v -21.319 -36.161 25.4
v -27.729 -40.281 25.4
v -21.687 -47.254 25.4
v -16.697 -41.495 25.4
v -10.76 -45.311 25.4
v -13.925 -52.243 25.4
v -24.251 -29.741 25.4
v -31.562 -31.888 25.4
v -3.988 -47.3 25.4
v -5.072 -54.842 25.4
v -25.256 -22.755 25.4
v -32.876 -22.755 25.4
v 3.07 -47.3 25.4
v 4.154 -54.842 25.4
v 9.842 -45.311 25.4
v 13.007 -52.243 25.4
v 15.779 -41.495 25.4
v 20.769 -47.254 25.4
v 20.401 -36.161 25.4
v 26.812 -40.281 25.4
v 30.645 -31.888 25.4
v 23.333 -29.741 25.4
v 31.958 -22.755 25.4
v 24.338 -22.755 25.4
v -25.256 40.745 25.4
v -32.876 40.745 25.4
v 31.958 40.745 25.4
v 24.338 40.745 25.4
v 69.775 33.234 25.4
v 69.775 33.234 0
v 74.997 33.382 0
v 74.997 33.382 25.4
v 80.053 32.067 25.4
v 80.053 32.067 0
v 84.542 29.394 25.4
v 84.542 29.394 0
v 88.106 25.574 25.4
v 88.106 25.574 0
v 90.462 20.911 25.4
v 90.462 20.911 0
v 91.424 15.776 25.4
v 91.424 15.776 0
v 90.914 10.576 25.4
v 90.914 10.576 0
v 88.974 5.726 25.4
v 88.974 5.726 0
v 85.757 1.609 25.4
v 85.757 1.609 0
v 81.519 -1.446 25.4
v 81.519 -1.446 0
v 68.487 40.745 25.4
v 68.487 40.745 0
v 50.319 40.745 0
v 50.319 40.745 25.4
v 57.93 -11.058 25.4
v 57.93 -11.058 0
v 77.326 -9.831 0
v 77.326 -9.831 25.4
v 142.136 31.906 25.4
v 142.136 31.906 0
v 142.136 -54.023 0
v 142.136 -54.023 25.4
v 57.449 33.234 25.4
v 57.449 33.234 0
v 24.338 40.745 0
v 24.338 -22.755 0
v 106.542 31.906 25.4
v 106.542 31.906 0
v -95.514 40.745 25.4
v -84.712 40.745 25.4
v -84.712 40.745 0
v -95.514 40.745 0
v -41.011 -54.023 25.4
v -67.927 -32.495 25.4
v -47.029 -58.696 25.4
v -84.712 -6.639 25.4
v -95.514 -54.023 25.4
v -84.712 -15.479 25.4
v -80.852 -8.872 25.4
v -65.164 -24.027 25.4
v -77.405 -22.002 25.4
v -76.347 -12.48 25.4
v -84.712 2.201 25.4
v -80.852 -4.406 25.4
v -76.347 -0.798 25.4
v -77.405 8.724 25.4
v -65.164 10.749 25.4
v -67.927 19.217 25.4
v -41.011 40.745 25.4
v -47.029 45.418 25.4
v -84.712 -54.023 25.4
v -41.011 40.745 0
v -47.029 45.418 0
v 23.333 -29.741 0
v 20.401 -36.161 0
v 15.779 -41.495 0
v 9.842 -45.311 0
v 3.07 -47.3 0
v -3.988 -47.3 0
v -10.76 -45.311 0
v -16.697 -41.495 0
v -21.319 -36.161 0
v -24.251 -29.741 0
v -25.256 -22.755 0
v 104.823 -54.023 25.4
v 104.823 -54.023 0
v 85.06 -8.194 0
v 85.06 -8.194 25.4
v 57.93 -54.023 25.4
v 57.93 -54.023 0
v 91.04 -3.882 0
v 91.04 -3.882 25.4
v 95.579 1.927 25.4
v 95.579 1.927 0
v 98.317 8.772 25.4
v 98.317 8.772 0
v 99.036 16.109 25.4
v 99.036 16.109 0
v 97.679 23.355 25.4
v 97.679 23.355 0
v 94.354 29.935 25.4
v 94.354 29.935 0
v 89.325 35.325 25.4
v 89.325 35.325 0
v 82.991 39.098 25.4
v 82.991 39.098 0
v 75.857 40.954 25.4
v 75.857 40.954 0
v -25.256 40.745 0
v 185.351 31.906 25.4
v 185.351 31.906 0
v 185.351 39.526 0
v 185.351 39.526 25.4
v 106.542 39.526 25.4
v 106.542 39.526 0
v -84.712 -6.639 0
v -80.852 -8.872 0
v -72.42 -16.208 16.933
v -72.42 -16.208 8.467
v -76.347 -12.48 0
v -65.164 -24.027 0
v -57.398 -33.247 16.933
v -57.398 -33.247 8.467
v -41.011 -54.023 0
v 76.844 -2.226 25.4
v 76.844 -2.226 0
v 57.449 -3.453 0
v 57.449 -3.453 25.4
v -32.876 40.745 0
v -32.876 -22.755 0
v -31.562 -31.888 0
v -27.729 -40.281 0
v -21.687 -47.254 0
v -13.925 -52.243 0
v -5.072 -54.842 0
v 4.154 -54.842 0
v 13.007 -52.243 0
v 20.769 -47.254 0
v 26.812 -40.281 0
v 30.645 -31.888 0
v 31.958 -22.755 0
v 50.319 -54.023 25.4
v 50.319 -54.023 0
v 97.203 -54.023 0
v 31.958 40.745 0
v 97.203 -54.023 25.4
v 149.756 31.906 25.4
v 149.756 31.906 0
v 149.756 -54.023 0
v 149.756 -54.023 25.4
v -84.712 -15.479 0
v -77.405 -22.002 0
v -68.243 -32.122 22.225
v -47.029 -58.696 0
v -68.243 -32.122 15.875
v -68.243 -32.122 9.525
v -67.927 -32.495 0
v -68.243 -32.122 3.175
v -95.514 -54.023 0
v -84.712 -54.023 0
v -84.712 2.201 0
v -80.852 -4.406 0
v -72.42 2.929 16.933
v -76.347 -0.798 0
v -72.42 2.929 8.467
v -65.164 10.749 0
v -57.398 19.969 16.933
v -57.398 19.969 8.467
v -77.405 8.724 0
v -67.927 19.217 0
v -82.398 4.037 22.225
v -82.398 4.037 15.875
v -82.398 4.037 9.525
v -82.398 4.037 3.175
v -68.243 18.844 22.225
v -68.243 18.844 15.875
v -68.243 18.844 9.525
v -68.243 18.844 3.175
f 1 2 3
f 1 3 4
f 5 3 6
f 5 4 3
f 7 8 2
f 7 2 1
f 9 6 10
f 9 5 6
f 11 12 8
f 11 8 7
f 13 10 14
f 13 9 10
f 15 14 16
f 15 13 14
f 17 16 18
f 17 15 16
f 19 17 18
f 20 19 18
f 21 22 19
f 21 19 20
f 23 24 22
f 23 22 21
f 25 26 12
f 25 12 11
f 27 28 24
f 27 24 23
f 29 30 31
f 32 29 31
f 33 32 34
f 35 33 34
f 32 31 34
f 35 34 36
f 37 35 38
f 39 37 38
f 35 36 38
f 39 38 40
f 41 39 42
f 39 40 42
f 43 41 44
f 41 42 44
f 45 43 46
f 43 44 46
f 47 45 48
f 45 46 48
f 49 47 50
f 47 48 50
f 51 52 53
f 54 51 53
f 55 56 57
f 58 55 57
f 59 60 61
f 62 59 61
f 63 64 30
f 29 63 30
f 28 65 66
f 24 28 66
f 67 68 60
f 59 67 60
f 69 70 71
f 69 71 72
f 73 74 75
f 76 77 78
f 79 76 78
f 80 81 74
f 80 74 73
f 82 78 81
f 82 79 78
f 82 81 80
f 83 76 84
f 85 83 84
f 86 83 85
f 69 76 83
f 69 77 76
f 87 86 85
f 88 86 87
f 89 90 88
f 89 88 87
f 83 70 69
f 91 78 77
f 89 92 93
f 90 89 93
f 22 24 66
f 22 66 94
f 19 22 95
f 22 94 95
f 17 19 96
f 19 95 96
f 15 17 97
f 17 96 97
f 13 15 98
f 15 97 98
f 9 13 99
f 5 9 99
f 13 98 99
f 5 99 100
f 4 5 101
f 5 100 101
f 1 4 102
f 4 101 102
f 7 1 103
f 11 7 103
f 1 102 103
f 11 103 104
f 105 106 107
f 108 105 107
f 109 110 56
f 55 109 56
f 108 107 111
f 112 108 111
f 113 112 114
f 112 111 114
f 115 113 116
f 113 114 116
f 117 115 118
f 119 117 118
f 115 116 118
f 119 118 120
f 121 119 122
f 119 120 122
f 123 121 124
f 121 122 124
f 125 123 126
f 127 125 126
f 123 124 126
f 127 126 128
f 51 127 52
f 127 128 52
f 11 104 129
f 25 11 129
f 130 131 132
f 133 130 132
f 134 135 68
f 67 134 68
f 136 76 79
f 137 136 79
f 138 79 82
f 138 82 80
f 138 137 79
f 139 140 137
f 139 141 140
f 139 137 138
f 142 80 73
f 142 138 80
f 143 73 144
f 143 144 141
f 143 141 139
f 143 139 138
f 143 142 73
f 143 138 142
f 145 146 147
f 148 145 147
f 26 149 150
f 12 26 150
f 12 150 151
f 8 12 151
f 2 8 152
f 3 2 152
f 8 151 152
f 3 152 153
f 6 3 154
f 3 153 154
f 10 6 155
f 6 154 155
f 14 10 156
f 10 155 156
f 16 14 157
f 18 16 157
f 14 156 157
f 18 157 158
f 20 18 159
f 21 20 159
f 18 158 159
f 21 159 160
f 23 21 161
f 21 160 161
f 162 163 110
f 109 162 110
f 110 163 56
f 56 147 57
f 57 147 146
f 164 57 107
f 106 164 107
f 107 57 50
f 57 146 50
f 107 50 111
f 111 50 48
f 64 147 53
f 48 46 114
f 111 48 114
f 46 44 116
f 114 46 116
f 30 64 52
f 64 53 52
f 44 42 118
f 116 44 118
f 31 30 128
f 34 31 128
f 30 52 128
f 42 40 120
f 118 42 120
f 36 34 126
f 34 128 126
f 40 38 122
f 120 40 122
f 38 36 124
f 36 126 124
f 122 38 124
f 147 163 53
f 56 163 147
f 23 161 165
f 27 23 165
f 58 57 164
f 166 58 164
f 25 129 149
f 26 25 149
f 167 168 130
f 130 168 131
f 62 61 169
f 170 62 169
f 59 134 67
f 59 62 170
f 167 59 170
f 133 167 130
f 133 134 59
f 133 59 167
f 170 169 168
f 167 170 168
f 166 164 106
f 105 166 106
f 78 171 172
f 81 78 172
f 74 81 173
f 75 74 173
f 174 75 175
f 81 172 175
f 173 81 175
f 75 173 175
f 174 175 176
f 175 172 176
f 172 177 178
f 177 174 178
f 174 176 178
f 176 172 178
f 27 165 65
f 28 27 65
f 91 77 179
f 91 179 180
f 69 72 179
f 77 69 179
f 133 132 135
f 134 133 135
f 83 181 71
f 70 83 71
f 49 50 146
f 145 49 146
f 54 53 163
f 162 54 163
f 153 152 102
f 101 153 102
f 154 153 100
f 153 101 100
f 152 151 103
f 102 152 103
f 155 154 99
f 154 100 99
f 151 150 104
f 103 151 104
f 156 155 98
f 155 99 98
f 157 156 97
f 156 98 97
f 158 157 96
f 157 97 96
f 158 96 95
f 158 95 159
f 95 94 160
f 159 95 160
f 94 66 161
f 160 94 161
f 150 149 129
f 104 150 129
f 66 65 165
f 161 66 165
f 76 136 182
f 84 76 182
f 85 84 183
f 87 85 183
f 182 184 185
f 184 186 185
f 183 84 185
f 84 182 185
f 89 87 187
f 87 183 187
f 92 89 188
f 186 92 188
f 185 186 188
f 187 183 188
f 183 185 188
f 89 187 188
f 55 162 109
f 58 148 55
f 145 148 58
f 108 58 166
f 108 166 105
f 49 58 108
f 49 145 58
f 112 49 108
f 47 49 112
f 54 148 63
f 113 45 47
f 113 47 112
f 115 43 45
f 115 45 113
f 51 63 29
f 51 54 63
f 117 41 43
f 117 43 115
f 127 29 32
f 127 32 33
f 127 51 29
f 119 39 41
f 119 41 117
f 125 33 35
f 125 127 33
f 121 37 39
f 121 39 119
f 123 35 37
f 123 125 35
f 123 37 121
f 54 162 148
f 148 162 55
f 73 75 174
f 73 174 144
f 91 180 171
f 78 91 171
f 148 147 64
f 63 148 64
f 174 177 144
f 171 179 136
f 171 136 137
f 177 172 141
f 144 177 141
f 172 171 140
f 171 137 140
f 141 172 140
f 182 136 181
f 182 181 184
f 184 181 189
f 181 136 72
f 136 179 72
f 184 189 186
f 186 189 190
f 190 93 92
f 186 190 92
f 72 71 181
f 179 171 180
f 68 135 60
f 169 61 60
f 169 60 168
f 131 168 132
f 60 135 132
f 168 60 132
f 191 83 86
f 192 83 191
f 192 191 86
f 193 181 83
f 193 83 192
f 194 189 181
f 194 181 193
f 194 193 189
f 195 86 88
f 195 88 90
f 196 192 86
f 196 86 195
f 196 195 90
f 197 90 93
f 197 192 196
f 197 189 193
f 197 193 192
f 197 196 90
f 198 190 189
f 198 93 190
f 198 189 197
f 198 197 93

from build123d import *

# Parameters (mm, degrees)
F1_DEPTH = 25.4


# Not quite as in the source:
# - ends of sketch curves that miss each other by under 0.0002 mm in the source are joined
# - the dataset's text gives a spline's control points without its knots; the knots are read off the source's solid


with BuildPart() as f1:
    # F0 (on Top) → F1 (new body)
    with BuildSketch(Plane.XY):
        with BuildLine():
            Line((-84.7116485238, 40.7445728779), (-95.5141410232, 40.7445728779))
            Line((-95.5141410232, 40.7445728779), (-95.5141410232, -6.6390763968))
            add(Edge.make_bspline(
                [(-95.5141410232, -6.6390763968), (-92.2564229583, -5.7000227681), (-88.9987048935, -4.7609691395), (-84.7116485238, -6.6390763968)],
                knots=[0, 0, 0, 0, 0.2904648184, 0.2904648184, 0.2904648184, 0.2904648184], degree=3))
            Line((-84.7116485238, -6.6390763968), (-84.7116485238, 2.2007589152))
            Line((-84.7116485238, 2.2007589152), (-84.7116485238, 40.7445728779))
        make_face()
        with BuildLine():
            add(Edge.make_bspline(
                [(-95.5141410232, -6.6390763968), (-92.2564229583, -7.5781300255), (-88.9987048935, -8.5171836542), (-84.7116485238, -6.6390763968)],
                knots=[0, 0, 0, 0, 0.2904648184, 0.2904648184, 0.2904648184, 0.2904648184], degree=3))
            Line((-95.5141410232, -6.6390763968), (-95.5141410232, -54.0227256715))
            Line((-95.5141410232, -54.0227256715), (-84.7116485238, -54.0227256715))
            Line((-84.7116485238, -54.0227256715), (-84.7116485238, -15.4789117092))
            Line((-84.7116485238, -15.4789117092), (-84.7116485238, -6.6390763968))
        make_face()
        with BuildLine():
            add(Edge.make_bspline(
                [(-95.5141410232, -6.6390763968), (-92.2564229583, -5.7000227681), (-88.9987048935, -4.7609691395), (-84.7116485238, -6.6390763968)],
                knots=[0, 0, 0, 0, 0.2904648184, 0.2904648184, 0.2904648184, 0.2904648184], degree=3))
            add(Edge.make_bspline(
                [(-95.5141410232, -6.6390763968), (-92.2564229583, -7.5781300255), (-88.9987048935, -8.5171836542), (-84.7116485238, -6.6390763968)],
                knots=[0, 0, 0, 0, 0.2904648184, 0.2904648184, 0.2904648184, 0.2904648184], degree=3))
        make_face()
        with BuildLine():
            add(Edge.make_bspline(
                [(-84.7117154486, 2.2007589152), (-83.9995557093, 2.721358536), (-82.2984407254, 4.0678338376), (-79.3197247041, 6.7769854886), (-75.8651516776, 10.2660987459), (-72.166048126, 14.2950229097), (-68.2697421496, 18.7810126405), (-62.8627961927, 25.267445643), (-55.7912554843, 34.1333862174), (-49.9563950251, 41.6480964378), (-47.0294138372, 45.4178080531)],
                knots=[0.3849384709, 0.3849384709, 0.3849384709, 0.3849384709, 0.4375, 0.5, 0.5625, 0.625, 0.6875, 0.75, 0.875, 1, 1, 1, 1], degree=3))
            Line((-84.7117154486, 2.2007589152), (-84.7116485238, -6.6390763968))
            add(Edge.make_bspline(
                [(-84.7116485238, -6.6390763968), (-74.2394084221, -2.0513153692), (-57.625039393, 19.3466287543), (-41.0106703639, 40.7445728779)],
                knots=[0.2904648184, 0.2904648184, 0.2904648184, 0.2904648184, 1, 1, 1, 1], degree=3))
            Line((-41.0106703639, 40.7445728779), (-47.0294138372, 45.4178080531))
        make_face()
        with BuildLine():
            add(Edge.make_bspline(
                [(-84.7116485238, -6.6390763968), (-74.2394084221, -11.2268374245), (-57.625039393, -32.624781548), (-41.0106703639, -54.0227256715)],
                knots=[0.2904648184, 0.2904648184, 0.2904648184, 0.2904648184, 1, 1, 1, 1], degree=3))
            Line((-84.7116485238, -6.6390763968), (-84.7116485238, -15.4789117092))
            add(Edge.make_bspline(
                [(-84.7116485238, -15.4789117092), (-83.999555709, -15.9995113299), (-82.2984407252, -17.3459866313), (-79.3197247041, -20.0551382822), (-75.8651516776, -23.5442515395), (-72.166048126, -27.5731757034), (-68.2697421496, -32.0591654341), (-62.8627961927, -38.5455984366), (-55.7912554843, -47.411539011), (-49.9563950251, -54.9262492315), (-47.0294138372, -58.6959608468)],
                knots=[0.3849384709, 0.3849384709, 0.3849384709, 0.3849384709, 0.4375, 0.5, 0.5625, 0.625, 0.6875, 0.75, 0.875, 1, 1, 1, 1], degree=3))
            Line((-47.0294138372, -58.6959608468), (-41.0106703639, -54.0227256715))
        make_face()
    extrude(amount=F1_DEPTH)


with BuildPart() as f1b:
    # F0 (on Top) → F1, piece 2 (new body)
    with BuildSketch(Plane.XY):
        with BuildLine():
            Line((-25.2555142003, -22.7554271221), (-25.2555142003, 40.7445728779))
            Line((-25.2555142003, 40.7445728779), (-32.8755142003, 40.7445728779))
            Line((-32.8755142003, 40.7445728779), (-32.8755142003, -22.7554271221))
            ThreePointArc((-32.8755142003, -22.7554271221), (-0.458891395, -55.1720499274), (31.9577314103, -22.7554271221))
            Line((31.9577314103, -22.7554271221), (31.9577314103, 40.7445728779))
            Line((31.9577314103, 40.7445728779), (24.3377314103, 40.7445728779))
            Line((24.3377314103, 40.7445728779), (24.3377314103, -22.7554271221))
            ThreePointArc((24.3377314103, -22.7554271221), (-0.458891395, -47.5520499274), (-25.2555142003, -22.7554271221))
        make_face()
    extrude(amount=F1_DEPTH)


with BuildPart() as f1c:
    # F0 (on Top) → F1, piece 3 (new body)
    with BuildSketch(Plane.XY):
        with BuildLine():
            Line((68.4872940183, 40.7445728779), (50.3194704652, 40.7445728779))
            Line((50.3194704652, 40.7445728779), (50.3194704652, -54.0227256715))
            Line((50.3194704652, -54.0227256715), (57.9303130507, -54.0227256715))
            Line((57.9303130507, -54.0227256715), (57.9303130507, -11.0582793131))
            Line((57.9303130507, -11.0582793131), (77.325694263, -9.8307235166))
            Line((77.325694263, -9.8307235166), (97.2029411244, -54.0227256715))
            Line((97.2029411244, -54.0227256715), (104.8229411244, -54.0227256715))
            Line((104.8229411244, -54.0227256715), (85.059591811, -8.1937922423))
            ThreePointArc((85.059591811, -8.1937922423), (97.6793396869, 23.3548819617), (68.4872940183, 40.7445728779))
        make_face()
        with BuildLine():
            Line((57.4489976161, 33.2341308831), (69.7747958795, 33.2341308831))
            ThreePointArc((69.7747958795, 33.2341308831), (90.4619367109, 20.9108086643), (81.5188669265, -1.4463729362))
            Line((81.5188669265, -1.4463729362), (76.8443788283, -2.225939795))
            Line((76.8443788283, -2.225939795), (57.4489976161, -3.4534955915))
            Line((57.4489976161, -3.4534955915), (57.4489976161, 33.2341308831))
        make_face(mode=Mode.SUBTRACT)
    extrude(amount=F1_DEPTH)


with BuildPart() as f1d:
    # F0 (on Top) → F1, piece 4 (new body)
    with BuildSketch(Plane.XY):
        Polygon((185.3505820036, 39.5261689079), (106.5415218472, 39.5261689079), (106.5415218472, 31.9061689079), (142.1360519254, 31.9061689079), (145.9460519254, 31.9061689079), (149.7560519254, 31.9061689079), (185.3505820036, 31.9061689079), align=None)
        Polygon((145.9460519254, 31.9061689079), (142.1360519254, 31.9061689079), (142.1360519254, -54.0227256715), (145.9460519254, -54.0227256715), (149.7560519254, -54.0227256715), (149.7560519254, 31.9061689079), align=None)
    extrude(amount=F1_DEPTH)


solid = Compound([f1.part, f1b.part, f1c.part, f1d.part])
